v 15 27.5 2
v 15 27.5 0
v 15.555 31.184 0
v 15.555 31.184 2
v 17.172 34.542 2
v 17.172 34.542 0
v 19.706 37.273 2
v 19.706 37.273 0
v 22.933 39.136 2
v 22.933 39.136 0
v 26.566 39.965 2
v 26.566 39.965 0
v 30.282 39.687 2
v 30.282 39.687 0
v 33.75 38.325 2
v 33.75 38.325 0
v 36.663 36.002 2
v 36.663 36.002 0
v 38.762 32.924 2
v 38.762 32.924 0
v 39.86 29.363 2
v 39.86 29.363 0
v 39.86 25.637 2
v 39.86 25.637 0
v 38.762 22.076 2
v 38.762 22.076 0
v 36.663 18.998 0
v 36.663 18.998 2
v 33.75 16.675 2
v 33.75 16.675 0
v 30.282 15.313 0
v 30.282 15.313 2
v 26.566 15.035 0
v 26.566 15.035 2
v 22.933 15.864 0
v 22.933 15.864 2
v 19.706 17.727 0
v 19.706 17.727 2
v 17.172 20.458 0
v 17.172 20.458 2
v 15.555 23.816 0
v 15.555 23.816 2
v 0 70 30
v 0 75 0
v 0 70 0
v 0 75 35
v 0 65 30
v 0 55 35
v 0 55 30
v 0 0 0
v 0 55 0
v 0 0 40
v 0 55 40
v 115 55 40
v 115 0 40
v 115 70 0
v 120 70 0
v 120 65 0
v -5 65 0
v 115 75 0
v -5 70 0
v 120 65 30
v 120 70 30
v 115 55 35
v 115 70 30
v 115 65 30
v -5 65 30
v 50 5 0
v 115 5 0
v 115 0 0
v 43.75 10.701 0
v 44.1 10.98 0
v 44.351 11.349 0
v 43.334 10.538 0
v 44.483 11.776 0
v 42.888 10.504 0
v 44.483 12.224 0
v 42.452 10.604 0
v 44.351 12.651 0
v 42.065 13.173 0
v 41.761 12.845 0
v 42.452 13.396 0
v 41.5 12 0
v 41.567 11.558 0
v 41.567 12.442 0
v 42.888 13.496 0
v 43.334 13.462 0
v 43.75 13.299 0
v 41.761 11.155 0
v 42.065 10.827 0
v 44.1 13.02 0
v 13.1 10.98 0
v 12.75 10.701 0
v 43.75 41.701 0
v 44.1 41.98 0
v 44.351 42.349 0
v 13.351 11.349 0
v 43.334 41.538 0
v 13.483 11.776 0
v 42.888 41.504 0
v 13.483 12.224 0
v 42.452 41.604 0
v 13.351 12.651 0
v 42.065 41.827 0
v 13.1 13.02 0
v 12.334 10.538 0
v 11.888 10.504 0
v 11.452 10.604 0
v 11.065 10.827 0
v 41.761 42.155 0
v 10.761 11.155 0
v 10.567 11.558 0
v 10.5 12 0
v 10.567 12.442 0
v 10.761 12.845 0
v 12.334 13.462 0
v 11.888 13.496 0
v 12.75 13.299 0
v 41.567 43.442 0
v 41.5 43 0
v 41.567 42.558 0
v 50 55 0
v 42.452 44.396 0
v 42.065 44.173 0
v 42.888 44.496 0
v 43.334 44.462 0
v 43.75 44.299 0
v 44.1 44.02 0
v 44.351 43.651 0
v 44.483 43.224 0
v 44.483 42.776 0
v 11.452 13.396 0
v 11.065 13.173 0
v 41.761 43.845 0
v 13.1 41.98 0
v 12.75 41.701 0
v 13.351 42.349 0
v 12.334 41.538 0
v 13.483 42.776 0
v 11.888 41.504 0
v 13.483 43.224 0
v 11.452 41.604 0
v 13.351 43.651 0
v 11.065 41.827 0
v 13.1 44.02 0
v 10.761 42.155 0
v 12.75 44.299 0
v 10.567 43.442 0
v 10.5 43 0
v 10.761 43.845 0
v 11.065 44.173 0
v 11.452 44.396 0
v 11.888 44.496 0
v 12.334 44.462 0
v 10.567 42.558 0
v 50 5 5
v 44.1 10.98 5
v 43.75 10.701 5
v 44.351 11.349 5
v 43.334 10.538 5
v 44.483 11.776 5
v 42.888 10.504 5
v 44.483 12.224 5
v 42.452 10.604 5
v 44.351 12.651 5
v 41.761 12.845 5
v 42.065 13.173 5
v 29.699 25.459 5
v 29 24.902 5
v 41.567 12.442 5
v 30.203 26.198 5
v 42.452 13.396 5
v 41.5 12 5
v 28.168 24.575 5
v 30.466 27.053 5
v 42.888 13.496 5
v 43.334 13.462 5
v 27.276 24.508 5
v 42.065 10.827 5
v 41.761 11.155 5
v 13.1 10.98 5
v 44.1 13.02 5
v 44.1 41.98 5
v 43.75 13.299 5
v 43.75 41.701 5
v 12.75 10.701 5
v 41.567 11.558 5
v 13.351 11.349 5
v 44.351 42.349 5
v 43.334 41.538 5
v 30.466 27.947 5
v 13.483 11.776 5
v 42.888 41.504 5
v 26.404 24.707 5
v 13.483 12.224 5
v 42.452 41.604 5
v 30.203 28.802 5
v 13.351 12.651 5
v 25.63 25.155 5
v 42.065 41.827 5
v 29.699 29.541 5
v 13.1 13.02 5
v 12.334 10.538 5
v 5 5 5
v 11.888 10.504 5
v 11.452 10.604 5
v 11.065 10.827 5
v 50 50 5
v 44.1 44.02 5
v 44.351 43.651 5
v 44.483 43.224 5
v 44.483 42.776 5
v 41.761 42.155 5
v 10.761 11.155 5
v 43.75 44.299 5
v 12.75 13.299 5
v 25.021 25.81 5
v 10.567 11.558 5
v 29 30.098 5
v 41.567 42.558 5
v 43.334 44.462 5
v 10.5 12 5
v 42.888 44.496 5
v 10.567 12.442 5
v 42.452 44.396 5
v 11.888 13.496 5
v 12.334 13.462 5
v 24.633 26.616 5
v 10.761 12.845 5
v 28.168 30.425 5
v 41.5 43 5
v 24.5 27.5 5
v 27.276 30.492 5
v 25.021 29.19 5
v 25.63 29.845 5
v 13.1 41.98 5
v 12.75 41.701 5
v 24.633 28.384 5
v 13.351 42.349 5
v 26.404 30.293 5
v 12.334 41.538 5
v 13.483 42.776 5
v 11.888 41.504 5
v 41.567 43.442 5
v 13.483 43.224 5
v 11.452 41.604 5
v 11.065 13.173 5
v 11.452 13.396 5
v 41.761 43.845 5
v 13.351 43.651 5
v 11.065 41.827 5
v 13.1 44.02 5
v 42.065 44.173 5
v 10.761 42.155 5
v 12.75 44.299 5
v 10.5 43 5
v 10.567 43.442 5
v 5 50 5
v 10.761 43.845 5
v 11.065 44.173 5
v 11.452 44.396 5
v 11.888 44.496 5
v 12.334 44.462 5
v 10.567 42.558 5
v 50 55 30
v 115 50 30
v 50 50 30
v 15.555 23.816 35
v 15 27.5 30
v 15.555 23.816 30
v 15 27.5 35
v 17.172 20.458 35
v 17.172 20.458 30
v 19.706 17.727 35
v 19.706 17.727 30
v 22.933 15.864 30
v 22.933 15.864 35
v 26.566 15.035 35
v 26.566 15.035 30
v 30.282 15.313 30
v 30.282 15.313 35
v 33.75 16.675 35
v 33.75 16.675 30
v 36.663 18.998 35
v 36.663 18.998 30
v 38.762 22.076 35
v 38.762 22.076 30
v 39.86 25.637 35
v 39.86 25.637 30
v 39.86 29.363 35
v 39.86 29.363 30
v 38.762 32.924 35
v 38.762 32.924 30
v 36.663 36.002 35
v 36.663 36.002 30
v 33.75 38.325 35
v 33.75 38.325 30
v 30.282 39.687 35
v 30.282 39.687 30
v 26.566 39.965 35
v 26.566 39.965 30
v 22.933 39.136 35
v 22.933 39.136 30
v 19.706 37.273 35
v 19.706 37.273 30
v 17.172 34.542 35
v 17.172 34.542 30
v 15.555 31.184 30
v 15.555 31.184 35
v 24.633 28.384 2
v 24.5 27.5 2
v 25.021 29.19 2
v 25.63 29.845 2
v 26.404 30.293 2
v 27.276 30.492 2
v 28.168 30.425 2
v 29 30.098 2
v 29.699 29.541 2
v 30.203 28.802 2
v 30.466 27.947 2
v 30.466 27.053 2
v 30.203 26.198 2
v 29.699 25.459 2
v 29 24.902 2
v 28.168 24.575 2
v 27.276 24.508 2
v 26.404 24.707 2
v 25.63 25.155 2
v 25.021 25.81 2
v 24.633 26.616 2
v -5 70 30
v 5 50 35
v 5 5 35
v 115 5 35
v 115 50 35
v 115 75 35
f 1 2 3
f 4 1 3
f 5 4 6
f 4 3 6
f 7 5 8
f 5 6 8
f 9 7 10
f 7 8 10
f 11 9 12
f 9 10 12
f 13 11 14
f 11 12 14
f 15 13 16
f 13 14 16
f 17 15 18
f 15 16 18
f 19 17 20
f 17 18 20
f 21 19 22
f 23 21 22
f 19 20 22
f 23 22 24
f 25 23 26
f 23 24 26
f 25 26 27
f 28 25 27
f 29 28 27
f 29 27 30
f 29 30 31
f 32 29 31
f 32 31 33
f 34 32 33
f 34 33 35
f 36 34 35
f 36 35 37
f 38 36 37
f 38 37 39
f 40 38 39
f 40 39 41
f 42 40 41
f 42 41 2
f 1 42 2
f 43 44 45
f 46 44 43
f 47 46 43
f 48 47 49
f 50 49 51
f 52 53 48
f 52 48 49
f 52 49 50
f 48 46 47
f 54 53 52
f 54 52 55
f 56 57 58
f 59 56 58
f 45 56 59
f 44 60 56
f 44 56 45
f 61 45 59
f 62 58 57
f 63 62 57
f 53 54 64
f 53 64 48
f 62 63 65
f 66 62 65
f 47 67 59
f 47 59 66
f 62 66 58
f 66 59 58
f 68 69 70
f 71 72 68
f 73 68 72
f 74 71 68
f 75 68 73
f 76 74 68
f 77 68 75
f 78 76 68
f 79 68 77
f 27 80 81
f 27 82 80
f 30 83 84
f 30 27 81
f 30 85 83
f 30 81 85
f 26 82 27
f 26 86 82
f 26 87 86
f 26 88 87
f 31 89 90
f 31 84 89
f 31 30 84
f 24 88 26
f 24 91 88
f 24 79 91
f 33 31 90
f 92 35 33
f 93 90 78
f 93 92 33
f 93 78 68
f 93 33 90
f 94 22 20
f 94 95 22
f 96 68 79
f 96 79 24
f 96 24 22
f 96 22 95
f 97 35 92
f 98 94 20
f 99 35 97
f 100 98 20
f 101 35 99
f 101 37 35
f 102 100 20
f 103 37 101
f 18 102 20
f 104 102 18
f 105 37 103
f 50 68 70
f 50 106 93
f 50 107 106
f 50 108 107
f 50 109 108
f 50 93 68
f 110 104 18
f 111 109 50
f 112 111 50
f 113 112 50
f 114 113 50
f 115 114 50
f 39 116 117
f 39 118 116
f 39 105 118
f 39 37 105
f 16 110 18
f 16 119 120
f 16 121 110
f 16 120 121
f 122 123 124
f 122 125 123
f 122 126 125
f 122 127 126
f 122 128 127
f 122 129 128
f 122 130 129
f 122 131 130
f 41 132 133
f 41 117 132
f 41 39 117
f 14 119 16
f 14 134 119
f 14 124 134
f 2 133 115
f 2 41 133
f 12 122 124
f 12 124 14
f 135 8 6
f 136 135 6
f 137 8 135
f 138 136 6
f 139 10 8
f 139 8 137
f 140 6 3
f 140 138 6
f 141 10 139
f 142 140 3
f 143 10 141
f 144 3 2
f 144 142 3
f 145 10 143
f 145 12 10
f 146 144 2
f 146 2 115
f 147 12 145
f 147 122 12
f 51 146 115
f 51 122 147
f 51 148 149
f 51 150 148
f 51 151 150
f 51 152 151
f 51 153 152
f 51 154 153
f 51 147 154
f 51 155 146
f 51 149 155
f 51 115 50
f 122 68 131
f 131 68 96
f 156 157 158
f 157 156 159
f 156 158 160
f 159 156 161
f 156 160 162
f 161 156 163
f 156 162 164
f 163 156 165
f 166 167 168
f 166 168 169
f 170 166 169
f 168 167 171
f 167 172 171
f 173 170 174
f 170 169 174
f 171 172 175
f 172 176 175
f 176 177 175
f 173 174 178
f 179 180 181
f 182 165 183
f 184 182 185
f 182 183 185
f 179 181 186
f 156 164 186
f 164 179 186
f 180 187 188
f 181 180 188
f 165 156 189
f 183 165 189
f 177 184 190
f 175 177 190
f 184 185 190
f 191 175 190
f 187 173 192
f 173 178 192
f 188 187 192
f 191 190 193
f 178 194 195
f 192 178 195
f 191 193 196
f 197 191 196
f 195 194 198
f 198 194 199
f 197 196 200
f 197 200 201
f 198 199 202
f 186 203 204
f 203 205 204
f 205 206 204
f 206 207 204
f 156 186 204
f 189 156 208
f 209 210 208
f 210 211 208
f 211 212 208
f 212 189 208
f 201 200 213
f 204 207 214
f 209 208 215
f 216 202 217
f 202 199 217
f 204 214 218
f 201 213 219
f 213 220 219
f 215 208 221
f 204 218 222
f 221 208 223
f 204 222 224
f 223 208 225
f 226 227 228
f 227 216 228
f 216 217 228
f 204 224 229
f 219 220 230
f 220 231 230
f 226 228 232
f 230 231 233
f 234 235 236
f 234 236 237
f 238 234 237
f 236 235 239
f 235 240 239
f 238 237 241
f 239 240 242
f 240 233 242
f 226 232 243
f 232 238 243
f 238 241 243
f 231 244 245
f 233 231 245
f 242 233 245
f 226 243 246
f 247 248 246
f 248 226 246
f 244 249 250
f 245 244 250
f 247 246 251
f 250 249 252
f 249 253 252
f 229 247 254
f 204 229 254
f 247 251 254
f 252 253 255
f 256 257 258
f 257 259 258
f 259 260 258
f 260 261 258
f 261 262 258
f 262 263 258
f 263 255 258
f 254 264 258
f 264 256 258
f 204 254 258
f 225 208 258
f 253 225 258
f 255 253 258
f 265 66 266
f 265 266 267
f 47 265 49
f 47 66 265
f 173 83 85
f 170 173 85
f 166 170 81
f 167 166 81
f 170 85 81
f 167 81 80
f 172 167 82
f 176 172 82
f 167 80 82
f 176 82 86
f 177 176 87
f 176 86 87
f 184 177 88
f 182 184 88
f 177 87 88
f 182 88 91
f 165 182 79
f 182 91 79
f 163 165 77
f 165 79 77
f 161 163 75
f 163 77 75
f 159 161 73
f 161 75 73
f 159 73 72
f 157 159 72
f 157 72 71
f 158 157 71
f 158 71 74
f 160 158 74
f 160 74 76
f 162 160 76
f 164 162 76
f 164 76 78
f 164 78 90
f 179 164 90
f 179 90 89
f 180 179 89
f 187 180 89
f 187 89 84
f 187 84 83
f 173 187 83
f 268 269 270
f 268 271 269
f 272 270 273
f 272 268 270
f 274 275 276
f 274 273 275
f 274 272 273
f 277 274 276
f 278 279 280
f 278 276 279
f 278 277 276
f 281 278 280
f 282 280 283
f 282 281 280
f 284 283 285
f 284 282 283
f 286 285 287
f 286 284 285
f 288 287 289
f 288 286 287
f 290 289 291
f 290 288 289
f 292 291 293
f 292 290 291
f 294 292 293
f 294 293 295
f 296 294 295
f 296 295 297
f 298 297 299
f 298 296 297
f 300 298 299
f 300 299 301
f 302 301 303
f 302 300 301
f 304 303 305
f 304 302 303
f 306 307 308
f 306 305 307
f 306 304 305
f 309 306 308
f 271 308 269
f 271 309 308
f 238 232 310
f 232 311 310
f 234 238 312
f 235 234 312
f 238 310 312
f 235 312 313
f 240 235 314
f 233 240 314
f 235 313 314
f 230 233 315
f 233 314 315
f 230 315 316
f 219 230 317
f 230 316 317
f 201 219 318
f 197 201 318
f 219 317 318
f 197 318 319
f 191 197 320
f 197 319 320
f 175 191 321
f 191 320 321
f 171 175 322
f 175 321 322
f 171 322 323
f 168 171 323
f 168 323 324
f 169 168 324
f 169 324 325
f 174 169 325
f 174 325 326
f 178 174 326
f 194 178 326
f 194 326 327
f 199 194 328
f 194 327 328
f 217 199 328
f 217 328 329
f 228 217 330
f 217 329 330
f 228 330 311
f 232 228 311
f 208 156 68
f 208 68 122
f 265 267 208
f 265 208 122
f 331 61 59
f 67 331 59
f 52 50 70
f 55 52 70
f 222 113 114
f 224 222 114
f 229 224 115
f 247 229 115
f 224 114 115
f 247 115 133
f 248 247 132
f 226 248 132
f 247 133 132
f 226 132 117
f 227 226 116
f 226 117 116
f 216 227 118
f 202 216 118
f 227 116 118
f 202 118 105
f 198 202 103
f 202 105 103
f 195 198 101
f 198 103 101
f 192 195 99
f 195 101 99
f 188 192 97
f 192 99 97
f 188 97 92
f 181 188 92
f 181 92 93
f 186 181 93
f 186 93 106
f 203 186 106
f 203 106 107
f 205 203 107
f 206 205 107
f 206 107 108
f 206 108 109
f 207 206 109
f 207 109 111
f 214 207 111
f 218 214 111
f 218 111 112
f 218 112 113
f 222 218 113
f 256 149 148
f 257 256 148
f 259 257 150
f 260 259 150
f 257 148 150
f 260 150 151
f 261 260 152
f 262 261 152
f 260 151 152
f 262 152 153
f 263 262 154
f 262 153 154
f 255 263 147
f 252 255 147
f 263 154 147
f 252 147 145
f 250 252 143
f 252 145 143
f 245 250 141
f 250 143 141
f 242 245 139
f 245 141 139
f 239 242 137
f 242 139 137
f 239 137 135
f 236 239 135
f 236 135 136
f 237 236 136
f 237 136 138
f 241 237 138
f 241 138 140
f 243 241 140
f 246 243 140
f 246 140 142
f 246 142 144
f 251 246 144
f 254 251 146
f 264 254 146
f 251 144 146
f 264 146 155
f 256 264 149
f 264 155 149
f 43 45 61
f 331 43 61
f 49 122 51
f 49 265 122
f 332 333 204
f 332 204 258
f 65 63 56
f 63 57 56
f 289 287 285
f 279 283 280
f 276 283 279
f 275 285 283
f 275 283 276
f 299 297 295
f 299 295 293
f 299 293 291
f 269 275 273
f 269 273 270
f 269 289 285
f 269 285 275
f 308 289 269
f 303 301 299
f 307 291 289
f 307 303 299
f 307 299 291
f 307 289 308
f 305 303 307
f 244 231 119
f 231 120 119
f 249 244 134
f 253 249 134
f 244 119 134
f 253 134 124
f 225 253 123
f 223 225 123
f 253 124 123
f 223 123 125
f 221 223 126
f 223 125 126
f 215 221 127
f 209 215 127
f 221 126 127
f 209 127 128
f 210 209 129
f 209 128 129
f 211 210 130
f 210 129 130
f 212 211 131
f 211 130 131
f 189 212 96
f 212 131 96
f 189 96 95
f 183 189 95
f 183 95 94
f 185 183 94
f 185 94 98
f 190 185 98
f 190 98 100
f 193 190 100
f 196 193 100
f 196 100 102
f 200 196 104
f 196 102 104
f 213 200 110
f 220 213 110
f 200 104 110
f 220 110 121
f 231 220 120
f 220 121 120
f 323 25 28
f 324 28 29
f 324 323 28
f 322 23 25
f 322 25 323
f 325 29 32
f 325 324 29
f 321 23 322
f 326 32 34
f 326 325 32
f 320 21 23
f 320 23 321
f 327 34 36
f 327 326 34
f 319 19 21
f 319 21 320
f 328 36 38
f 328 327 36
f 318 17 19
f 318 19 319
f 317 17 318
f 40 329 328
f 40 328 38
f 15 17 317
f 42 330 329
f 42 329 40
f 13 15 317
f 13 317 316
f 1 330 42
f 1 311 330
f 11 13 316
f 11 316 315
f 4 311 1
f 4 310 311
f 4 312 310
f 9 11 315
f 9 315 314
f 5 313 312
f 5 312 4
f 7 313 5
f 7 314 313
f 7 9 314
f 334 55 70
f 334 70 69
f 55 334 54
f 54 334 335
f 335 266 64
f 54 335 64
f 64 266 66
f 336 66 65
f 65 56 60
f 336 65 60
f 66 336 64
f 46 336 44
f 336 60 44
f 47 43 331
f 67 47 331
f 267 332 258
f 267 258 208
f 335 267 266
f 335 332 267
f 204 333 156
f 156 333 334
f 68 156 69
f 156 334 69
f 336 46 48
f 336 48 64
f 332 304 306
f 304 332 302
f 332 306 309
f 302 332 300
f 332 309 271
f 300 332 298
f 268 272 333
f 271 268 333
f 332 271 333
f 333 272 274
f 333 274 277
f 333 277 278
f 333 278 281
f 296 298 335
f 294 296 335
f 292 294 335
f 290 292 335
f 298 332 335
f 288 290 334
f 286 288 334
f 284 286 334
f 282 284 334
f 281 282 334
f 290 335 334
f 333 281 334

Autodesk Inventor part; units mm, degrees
ref_plane "YZ Plane" through (0, 0, 0) normal (1, 0, 0) x (0, 1, 0)
ref_plane "XZ Plane" through (0, 0, 0) normal (0, 1, 0) x (-1, 0, 0)
ref_plane "XY Plane" through (0, 0, 0) normal (0, 0, 1) x (1, 0, 0)
sketch "Sketch1" plane through (0, 0, 0) normal (0, 0, 1) x (1, 0, 0)
  line L0 (0, 0) -> (115, 0)
  line L1 (115, 0) -> (115, 75)
  line L2 (115, 75) -> (0, 75)
  line L3 (0, 75) -> (0, 0)
  dimension "d0" = 115
  dimension "d1" = 75
extrude "Extrusion1" add sketch "Sketch1" along normal blind 40
sketch "Sketch2" plane through (0, 0, 40) normal (0, 0, 1) x (1, 0, 0)
  line L0 (115, 75) -> (0, 75) projected
  line L1 (115, 0) -> (115, 75) projected
  line L2 (0, 75) -> (115, 75)
  line L3 (115, 75) -> (115, 55)
  line L4 (115, 55) -> (0, 55)
  line L5 (0, 55) -> (0, 75)
  point P0 (0, 0)
  dimension "d4" = 20
extrude "Extrusion2" cut sketch "Sketch2" against normal blind 5
sketch "Sketch3" plane through (115, 0, 0) normal (1, 0, 0) x (0, 0, -1)
  line L0 (0, 75) -> (-35, 75) projected
  line L1 (-35, 75) -> (-35, 55) projected
  line L2 (-35, 55) -> (-40, 55) projected
  line L3 (-40, 0) -> (-40, 55) projected
  line L4 (0, 0) -> (-40, 0) projected
  line L5 (0, 70) -> (-30, 70)
  line L6 (-30, 70) -> (-30, 50)
  line L7 (-30, 50) -> (-35, 50)
  line L8 (-35, 50) -> (-35, 5)
  line L9 (-35, 5) -> (0, 5)
  line L10 (0, 5) -> (0, 70)
  line L11 (0, 0) -> (0, 75) projected
  dimension "d7" = 5
extrude "Extrusion3" cut sketch "Sketch3" against normal through all contours L10 L9 L8 L7 L6 L5
sketch "Sketch4" plane through (115, 5, 35) normal (0, 0, -1) x (-1, 0, 0)
  line L0 (0, 45) -> (115, 45) projected
  line L1 (115, 0) -> (0, 0) projected
  line L2 (115, 45) -> (110, 45)
  line L3 (110, 45) -> (110, 0)
  line L4 (110, 0) -> (115, 0)
  line L5 (115, 0) -> (115, 45)
  point P0 (115, -5)
  dimension "d10" = 5
extrude "Extrusion4" add sketch "Sketch4" along normal blind 5
sketch "Sketch5" plane through (115, 50, 30) normal (0, 0, -1) x (-1, 0, 0)
  line L0 (115, 20) -> (115, -45) projected
  line L1 (115, -45) -> (110, -45)
  line L2 (110, -45) -> (110, 0)
  line L3 (110, 0) -> (115, 0)
  line L4 (115, 0) -> (115, -45)
  point P0 (115, -50)
  dimension "d13" = 5
  dimension "d14" = 45
extrude "Extrusion5" add sketch "Sketch5" along normal blind 30
sketch "Sketch6" plane through (0, 0, 0) normal (0, 0, -1) x (-1, 0, 0)
  line L0 (-5, 5) -> (-5, 50) projected
  line L1 (-5, 5) -> (-50, 5)
  line L2 (-50, 5) -> (-50, 50)
  line L3 (-50, 50) -> (-5, 50)
  line L4 (-5, 50) -> (-5, 5)
  point P0 (0, 0)
  dimension "d17" = 45
  dimension "d18" = 45
extrude "Extrusion6" add sketch "Sketch6" against normal blind 5
sketch "Sketch7" plane through (0, 0, 0) normal (0, 0, -1) x (-1, 0, 0)
  line L0 (0, 50) -> (-50, 50) construction
  line L1 (-5, 5) -> (-5, 50) construction
  line L2 (-50, 50) -> (-5, 50) construction
  line L3 (-5, 50) -> (-5, 5) construction
  line L4 (-5, 5) -> (-50, 5) construction
  line L5 (-50, 5) -> (-50, 50) construction
  line L6 (-43, 12) -> (-12, 12) construction
  line L7 (-12, 12) -> (-12, 43) construction
  line L8 (-12, 43) -> (-43, 43) construction
  line L9 (-43, 43) -> (-43, 12) construction
  line L10 (-43, 12) -> (-12, 43) construction
  line L11 (-12, 12) -> (-43, 43) construction
  circle A0 centre (-43, 43) radius 1.5
  circle A1 centre (-12, 43) radius 1.5
  circle A2 centre (-43, 12) radius 1.5
  circle A3 centre (-12, 12) radius 1.5
  circle A4 centre (-27.5, 27.5) radius 3
  point P0 (0, 0)
  point P1 (-50, 27.5)
  point P2 (-27.5, 50)
  dimension "d21" = 45
  dimension "d22" = 45
  dimension "d23" = 31
  dimension "d24" = 31
  dimension "d25" = 3
  dimension "d26" = 3
  dimension "d27" = 3
  dimension "d28" = 3
  dimension "d29" = 6
extrude "Extrusion7" cut sketch "Sketch7" against normal blind 5
sketch "Sketch8" plane through (0, 0, 0) normal (0, 0, -1) x (-1, 0, 0)
  circle A0 centre (-27.5, 27.5) radius 3 projected
  circle A1 centre (-27.5, 27.5) radius 12.5
  point P0 (0, 0)
  dimension "d32" = 25
extrude "Extrusion8" cut sketch "Sketch8" against normal blind 2
sketch "Sketch9" plane through (115, 50, 30) normal (0, 0, -1) x (-1, 0, 0)
  line L0 (115, 5) -> (115, -50) projected
  line L1 (115, 0) -> (65, 0)
  line L2 (65, 0) -> (65, 5)
  line L3 (65, 5) -> (115, 5)
  line L4 (115, 5) -> (115, 0)
  dimension "d35" = 50
  dimension "d36" = 5
extrude "Extrusion9" add sketch "Sketch9" along normal blind 30
sketch "Sketch10" plane through (115, 5, 35) normal (0, 0, -1) x (-1, 0, 0)
  circle A0 centre (87.5, 22.5) radius 3 projected
  circle A1 centre (87.5, 22.5) radius 12.5
  point P0 (115, -5)
  dimension "d39" = 25
extrude "Extrusion10" add sketch "Sketch10" along normal blind 5 contours A0 | A1
sketch "Sketch11" plane through (0, 0, 0) normal (0, 0, -1) x (-1, 0, 0)
  line L0 (-120, 70) -> (5, 70)
  line L1 (5, 70) -> (5, 65)
  line L2 (5, 65) -> (-120, 65)
  line L3 (-120, 65) -> (-120, 70)
  line L4 (-115, 70) -> (-115, 75) projected
  point P0 (0, 0)
  point P1 (0, 70)
  dimension "d42" = 5
  dimension "d43" = 5
  dimension "d44" = 5
extrude "Extrusion11" add sketch "Sketch11" against normal blind 30
properties part number "FA003" material "ABS Plastic"
